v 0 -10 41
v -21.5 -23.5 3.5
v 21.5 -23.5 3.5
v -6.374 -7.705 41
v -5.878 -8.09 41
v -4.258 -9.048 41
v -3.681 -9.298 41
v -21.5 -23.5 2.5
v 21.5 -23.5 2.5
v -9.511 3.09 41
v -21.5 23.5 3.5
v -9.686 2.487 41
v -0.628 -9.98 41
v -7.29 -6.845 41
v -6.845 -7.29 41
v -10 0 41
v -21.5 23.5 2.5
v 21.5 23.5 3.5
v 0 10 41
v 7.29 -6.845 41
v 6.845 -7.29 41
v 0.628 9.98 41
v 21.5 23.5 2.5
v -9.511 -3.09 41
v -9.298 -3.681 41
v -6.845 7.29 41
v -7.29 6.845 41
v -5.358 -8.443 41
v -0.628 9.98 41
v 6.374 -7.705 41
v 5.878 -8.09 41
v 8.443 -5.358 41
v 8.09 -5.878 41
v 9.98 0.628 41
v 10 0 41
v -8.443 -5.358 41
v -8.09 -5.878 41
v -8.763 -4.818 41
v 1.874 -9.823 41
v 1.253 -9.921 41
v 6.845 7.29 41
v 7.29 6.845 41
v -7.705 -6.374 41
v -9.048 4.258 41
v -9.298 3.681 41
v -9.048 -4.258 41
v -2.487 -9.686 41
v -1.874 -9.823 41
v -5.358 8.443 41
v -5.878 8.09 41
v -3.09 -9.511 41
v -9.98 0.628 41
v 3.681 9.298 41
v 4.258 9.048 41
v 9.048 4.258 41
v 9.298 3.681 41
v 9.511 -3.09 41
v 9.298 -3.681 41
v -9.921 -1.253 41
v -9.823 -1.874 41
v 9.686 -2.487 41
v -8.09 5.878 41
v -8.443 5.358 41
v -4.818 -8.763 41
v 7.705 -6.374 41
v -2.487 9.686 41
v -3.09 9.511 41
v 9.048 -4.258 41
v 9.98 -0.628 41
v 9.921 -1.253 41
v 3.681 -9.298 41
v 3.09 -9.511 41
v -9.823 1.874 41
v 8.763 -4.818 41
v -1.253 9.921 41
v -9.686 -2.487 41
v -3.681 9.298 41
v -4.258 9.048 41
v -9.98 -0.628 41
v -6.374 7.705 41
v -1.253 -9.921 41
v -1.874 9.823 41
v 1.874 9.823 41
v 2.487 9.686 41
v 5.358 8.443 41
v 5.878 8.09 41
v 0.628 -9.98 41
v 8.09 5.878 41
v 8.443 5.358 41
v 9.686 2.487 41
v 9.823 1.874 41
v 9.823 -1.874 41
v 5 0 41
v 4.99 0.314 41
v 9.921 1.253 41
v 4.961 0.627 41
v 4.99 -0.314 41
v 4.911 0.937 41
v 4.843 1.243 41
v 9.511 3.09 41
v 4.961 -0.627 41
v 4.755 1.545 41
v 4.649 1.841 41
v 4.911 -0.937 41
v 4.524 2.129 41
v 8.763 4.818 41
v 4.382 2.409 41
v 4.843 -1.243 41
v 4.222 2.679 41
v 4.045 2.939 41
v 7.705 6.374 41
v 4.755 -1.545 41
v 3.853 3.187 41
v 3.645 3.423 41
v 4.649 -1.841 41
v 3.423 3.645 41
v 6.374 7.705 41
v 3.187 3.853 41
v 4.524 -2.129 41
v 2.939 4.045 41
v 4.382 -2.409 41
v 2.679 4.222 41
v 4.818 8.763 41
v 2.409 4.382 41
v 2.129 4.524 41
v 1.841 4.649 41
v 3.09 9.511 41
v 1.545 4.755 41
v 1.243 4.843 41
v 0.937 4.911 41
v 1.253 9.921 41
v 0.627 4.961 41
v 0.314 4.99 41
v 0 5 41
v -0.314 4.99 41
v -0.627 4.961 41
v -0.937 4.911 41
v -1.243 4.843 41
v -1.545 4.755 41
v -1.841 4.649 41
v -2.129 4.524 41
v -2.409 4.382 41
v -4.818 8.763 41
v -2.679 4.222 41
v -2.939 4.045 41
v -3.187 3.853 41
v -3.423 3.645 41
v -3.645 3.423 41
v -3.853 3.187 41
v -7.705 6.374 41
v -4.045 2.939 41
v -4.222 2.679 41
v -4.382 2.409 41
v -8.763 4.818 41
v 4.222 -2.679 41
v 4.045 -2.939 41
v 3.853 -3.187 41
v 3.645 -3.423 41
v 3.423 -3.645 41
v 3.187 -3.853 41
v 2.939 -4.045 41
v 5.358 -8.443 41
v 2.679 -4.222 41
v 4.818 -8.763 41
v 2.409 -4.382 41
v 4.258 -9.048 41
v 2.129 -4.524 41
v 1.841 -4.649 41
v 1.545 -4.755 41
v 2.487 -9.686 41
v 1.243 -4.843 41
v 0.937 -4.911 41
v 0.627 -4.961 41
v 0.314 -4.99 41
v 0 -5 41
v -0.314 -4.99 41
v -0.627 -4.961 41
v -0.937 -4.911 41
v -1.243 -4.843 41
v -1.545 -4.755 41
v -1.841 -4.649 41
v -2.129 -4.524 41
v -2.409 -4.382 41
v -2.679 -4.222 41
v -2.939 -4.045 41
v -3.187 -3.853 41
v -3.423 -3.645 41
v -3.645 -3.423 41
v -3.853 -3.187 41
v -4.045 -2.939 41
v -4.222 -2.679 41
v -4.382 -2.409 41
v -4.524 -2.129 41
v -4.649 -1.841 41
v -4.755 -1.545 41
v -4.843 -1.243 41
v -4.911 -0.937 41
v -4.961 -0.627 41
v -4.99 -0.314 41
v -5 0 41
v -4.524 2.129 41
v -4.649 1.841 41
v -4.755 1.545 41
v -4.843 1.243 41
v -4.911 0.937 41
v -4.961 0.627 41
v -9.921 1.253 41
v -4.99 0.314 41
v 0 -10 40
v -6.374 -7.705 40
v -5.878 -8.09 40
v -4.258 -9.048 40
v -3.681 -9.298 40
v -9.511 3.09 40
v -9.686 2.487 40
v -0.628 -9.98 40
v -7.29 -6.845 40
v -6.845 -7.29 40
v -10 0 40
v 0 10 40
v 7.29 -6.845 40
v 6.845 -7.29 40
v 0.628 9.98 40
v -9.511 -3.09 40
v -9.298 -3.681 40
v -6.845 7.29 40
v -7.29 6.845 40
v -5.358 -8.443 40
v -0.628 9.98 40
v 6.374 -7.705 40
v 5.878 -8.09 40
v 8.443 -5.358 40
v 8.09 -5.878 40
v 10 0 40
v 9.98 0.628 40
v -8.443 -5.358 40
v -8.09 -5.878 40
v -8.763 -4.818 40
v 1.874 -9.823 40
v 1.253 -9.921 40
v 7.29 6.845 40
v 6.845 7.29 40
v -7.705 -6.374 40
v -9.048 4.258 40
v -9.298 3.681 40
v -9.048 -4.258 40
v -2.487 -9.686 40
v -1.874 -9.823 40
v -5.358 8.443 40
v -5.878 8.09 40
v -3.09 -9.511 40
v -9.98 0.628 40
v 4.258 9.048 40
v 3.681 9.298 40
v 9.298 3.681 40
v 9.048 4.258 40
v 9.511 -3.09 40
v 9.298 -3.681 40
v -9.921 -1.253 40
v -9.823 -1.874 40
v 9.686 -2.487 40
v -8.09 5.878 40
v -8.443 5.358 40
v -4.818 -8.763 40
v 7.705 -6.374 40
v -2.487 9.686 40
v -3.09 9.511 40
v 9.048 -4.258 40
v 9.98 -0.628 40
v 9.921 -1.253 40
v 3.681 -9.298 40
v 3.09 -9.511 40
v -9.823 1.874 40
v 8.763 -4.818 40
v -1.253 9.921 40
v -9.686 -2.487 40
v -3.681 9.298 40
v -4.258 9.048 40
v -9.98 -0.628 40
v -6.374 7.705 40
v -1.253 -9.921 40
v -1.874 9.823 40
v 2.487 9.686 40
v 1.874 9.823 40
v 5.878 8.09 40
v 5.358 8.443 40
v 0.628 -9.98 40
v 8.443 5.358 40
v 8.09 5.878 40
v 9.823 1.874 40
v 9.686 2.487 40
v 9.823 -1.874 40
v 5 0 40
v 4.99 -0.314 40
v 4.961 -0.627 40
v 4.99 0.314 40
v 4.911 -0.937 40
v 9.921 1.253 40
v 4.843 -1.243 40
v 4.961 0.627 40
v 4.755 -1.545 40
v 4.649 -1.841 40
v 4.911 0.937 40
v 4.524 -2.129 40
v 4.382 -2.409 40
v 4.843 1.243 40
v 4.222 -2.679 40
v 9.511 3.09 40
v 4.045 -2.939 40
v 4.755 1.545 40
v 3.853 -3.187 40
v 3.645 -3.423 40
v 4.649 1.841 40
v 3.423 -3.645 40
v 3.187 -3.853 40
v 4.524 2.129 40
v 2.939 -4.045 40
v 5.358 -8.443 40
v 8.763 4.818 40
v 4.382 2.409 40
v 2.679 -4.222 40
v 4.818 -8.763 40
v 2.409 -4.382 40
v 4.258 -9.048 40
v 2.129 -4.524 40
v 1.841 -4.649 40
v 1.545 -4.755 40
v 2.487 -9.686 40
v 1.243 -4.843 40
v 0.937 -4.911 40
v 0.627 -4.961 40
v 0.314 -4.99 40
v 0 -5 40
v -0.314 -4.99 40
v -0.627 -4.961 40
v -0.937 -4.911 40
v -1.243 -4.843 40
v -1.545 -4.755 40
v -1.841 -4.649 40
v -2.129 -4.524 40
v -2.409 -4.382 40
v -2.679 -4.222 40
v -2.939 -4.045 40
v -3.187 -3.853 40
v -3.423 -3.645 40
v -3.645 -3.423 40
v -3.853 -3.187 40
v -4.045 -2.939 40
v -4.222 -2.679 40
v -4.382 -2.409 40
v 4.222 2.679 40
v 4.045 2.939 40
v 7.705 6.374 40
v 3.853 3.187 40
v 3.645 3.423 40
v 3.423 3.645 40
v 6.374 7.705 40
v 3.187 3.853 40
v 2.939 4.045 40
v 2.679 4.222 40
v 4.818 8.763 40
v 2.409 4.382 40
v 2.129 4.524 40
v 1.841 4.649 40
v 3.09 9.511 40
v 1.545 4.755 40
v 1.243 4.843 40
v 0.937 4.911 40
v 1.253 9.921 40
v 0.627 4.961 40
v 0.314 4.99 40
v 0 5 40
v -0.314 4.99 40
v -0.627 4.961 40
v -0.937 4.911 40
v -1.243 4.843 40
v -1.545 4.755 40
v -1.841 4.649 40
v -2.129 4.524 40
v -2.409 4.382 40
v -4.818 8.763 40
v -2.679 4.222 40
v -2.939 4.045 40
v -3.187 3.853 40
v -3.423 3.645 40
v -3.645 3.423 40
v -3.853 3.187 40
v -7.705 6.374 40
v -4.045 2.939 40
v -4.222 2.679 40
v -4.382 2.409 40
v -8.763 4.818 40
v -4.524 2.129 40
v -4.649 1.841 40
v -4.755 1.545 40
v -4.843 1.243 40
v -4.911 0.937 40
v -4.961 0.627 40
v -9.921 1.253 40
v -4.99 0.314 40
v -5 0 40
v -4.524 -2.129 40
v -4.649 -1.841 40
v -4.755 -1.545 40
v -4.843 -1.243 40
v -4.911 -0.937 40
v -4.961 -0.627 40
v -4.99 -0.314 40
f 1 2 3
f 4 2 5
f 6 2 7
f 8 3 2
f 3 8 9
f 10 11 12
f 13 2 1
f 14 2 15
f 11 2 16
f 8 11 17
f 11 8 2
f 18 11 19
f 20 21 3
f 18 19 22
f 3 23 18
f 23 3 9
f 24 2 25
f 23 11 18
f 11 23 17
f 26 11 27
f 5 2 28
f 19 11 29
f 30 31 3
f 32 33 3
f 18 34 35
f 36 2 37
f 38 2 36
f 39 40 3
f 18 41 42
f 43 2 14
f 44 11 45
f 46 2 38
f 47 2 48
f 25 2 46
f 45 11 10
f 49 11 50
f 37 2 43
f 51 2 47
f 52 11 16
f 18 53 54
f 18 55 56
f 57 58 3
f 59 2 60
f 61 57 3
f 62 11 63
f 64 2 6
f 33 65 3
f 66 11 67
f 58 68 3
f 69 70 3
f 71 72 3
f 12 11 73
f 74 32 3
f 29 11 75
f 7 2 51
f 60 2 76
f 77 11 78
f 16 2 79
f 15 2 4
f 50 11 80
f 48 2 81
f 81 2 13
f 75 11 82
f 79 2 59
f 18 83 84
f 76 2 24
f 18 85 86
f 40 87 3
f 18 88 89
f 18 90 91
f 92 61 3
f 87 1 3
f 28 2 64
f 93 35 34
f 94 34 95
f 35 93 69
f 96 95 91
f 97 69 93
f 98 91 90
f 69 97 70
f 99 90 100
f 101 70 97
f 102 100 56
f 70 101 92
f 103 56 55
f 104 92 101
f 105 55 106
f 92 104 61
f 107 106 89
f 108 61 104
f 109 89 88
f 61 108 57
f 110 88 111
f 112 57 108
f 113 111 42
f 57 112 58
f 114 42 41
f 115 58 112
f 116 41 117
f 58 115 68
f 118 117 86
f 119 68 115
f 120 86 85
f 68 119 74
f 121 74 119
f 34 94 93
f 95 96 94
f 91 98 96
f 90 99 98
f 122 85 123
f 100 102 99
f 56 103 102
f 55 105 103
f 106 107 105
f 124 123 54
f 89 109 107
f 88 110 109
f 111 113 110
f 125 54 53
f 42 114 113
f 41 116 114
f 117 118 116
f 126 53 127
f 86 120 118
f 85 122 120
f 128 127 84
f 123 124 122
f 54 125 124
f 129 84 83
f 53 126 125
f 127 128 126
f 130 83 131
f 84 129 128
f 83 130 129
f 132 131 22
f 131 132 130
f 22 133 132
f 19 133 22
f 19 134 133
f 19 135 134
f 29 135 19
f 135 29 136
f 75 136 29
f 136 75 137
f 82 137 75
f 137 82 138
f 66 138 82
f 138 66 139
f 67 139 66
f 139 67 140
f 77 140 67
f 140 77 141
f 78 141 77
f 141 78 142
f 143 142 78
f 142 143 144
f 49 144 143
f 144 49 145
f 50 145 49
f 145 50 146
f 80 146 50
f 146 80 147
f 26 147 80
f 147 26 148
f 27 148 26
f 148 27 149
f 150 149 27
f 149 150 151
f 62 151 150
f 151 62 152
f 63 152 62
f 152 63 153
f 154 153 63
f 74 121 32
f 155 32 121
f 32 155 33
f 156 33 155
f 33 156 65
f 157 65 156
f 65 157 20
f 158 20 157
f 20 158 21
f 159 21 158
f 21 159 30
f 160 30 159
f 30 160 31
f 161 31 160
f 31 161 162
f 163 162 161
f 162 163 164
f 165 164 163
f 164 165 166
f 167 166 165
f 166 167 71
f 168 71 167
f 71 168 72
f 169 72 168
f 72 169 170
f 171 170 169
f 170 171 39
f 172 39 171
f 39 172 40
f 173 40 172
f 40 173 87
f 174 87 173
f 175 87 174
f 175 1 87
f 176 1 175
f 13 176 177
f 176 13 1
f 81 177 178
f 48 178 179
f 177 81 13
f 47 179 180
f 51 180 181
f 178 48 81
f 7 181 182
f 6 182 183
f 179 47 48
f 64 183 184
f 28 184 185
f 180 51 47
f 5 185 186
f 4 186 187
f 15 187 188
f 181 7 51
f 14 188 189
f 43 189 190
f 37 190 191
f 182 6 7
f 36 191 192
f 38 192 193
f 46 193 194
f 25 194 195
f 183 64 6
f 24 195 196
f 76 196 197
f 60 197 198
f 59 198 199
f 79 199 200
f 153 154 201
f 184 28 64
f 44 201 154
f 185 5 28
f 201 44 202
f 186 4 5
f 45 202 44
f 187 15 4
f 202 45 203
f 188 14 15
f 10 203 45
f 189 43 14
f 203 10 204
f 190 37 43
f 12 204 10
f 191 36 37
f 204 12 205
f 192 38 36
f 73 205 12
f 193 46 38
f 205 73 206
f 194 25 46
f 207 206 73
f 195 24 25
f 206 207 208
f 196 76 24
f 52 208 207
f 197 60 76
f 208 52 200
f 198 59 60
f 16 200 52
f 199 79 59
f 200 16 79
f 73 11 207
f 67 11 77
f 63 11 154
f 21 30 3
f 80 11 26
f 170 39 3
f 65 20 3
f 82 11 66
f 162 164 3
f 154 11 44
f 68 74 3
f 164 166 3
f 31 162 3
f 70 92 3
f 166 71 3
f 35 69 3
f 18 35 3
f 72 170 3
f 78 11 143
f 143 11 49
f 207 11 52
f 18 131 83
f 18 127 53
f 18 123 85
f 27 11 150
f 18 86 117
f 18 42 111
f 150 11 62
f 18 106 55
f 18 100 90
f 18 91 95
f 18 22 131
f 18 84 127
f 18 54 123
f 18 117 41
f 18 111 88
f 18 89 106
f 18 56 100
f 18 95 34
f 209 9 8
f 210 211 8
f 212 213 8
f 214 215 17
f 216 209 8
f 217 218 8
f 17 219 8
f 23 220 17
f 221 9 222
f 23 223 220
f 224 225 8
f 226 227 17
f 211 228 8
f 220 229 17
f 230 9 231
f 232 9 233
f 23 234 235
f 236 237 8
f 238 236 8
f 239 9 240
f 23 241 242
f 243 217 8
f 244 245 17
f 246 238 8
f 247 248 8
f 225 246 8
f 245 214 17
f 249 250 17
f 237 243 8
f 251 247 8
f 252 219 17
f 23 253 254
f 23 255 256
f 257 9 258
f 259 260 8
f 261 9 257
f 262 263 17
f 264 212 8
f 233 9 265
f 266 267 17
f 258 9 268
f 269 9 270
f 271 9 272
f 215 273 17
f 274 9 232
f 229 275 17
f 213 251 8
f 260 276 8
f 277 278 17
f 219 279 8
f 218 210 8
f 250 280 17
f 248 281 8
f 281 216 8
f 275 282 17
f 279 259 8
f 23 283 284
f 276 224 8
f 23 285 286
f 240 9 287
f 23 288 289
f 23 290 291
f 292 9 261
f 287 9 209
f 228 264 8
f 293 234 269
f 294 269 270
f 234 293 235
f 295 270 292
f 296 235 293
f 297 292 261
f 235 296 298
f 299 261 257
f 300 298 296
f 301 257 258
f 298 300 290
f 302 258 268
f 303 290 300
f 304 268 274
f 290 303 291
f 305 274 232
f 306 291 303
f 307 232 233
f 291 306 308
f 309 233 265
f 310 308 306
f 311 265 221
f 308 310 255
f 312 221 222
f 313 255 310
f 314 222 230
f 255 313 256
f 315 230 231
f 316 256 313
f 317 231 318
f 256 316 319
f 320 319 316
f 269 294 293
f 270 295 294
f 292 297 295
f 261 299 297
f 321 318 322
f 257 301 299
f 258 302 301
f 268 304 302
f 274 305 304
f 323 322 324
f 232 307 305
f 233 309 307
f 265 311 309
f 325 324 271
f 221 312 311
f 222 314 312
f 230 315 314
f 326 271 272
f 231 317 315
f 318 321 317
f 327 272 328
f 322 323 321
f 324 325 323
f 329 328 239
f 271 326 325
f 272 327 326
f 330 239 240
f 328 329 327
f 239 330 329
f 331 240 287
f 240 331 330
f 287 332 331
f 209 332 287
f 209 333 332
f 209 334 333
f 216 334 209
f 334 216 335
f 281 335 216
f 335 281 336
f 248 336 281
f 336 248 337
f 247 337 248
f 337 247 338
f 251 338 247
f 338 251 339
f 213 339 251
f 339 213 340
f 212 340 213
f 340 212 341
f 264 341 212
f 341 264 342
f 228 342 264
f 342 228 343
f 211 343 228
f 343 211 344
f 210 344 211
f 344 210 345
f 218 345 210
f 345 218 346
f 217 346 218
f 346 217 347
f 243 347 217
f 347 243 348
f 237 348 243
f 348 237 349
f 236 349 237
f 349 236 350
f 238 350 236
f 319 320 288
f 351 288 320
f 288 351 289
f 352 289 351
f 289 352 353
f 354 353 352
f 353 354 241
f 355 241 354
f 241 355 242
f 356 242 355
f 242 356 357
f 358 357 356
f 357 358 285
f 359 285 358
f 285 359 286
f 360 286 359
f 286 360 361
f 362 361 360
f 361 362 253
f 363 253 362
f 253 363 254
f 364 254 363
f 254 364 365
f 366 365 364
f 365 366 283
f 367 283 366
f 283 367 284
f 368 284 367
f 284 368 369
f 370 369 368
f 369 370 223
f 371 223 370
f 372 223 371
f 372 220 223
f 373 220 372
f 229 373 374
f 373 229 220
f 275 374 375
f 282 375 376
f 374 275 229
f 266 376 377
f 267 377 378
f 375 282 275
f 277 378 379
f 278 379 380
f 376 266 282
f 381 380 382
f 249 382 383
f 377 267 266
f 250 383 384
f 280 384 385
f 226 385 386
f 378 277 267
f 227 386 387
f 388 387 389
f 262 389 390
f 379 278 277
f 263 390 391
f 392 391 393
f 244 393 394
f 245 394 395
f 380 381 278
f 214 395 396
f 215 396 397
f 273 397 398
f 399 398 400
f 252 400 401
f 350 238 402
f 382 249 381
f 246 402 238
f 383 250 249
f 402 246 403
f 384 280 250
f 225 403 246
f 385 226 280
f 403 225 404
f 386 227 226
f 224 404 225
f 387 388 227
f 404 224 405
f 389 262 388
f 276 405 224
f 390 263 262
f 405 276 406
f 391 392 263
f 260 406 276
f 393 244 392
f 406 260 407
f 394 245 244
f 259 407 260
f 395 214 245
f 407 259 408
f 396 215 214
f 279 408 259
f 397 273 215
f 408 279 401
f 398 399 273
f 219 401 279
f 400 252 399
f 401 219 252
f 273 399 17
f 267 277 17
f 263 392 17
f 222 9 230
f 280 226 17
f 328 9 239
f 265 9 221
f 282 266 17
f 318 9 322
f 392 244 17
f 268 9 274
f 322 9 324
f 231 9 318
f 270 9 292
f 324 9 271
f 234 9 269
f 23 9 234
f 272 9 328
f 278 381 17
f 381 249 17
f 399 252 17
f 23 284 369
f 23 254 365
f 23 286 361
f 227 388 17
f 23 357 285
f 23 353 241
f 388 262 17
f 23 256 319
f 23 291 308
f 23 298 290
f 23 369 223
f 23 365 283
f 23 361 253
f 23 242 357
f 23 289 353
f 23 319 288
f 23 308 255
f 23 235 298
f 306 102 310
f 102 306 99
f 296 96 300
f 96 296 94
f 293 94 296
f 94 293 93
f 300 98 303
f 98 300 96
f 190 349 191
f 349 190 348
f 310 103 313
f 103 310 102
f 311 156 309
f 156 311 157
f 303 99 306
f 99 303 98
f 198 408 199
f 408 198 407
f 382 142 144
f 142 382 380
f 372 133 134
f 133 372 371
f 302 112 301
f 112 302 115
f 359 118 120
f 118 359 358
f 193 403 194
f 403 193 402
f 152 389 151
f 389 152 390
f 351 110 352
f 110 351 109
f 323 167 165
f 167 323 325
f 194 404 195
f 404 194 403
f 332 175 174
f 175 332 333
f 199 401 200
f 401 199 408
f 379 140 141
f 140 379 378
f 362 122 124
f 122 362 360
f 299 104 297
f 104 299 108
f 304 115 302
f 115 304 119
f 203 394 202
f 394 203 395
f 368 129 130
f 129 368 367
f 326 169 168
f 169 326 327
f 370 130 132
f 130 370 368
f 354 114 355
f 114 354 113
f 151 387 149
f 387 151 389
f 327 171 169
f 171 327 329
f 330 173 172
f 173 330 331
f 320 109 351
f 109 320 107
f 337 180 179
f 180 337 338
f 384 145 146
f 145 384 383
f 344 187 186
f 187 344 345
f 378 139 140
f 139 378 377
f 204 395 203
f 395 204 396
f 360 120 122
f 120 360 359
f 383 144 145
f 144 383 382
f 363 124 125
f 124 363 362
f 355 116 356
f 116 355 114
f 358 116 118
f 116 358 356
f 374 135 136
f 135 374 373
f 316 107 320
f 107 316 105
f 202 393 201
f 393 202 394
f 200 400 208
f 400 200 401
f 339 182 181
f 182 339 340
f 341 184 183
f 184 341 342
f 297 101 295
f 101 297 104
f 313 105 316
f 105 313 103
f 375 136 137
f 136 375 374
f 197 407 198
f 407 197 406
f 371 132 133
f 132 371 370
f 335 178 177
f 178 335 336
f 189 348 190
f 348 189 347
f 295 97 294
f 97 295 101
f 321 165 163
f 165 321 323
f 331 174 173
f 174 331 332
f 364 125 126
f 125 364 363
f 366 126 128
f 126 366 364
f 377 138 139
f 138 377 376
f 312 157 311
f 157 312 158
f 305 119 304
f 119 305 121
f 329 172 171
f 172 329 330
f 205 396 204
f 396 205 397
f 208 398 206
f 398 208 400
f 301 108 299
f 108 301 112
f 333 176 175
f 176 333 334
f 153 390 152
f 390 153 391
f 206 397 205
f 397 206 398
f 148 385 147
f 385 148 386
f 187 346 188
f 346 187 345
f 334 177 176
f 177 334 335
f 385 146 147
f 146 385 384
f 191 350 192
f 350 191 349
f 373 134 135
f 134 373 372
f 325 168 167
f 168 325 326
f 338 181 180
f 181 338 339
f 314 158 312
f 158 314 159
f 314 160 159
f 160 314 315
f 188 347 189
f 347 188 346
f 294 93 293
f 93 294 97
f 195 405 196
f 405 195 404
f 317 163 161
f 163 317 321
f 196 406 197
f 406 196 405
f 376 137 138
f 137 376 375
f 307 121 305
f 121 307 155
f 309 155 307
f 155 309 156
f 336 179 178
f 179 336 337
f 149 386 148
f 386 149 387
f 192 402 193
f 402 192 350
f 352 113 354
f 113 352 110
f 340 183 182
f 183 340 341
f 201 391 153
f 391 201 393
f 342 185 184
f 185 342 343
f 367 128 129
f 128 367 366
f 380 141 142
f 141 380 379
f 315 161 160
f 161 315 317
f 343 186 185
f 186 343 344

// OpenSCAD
$fn=100;

module cowling1() {
    module piece() {
        difference() {
        hull() {
            cylinder(40, 10, 10);
            cube([40, 40, 5], center=true);
        }
    }
    }
    
    difference() {
        translate([0, 0, 1]) piece();
        piece();
        cylinder(41,5,5);
    }
}

module cowling2() {
    module piece() {
        difference() {
        hull() {
            cylinder(40, 10, 10);
            cube([43, 47, 5], center=true);
        }
    }
    }
    
    difference() {
        translate([0, 0, 1]) piece();
        piece();
        cylinder(41,5,5);
    }
}

module tab() {
    difference() {
        intersection() {
        cylinder(2,r=4,center=true);
        cube(4);
    }
    }
}


cowling2();

//color("blue") translate([43/2, 47/2, 0]) tab();
